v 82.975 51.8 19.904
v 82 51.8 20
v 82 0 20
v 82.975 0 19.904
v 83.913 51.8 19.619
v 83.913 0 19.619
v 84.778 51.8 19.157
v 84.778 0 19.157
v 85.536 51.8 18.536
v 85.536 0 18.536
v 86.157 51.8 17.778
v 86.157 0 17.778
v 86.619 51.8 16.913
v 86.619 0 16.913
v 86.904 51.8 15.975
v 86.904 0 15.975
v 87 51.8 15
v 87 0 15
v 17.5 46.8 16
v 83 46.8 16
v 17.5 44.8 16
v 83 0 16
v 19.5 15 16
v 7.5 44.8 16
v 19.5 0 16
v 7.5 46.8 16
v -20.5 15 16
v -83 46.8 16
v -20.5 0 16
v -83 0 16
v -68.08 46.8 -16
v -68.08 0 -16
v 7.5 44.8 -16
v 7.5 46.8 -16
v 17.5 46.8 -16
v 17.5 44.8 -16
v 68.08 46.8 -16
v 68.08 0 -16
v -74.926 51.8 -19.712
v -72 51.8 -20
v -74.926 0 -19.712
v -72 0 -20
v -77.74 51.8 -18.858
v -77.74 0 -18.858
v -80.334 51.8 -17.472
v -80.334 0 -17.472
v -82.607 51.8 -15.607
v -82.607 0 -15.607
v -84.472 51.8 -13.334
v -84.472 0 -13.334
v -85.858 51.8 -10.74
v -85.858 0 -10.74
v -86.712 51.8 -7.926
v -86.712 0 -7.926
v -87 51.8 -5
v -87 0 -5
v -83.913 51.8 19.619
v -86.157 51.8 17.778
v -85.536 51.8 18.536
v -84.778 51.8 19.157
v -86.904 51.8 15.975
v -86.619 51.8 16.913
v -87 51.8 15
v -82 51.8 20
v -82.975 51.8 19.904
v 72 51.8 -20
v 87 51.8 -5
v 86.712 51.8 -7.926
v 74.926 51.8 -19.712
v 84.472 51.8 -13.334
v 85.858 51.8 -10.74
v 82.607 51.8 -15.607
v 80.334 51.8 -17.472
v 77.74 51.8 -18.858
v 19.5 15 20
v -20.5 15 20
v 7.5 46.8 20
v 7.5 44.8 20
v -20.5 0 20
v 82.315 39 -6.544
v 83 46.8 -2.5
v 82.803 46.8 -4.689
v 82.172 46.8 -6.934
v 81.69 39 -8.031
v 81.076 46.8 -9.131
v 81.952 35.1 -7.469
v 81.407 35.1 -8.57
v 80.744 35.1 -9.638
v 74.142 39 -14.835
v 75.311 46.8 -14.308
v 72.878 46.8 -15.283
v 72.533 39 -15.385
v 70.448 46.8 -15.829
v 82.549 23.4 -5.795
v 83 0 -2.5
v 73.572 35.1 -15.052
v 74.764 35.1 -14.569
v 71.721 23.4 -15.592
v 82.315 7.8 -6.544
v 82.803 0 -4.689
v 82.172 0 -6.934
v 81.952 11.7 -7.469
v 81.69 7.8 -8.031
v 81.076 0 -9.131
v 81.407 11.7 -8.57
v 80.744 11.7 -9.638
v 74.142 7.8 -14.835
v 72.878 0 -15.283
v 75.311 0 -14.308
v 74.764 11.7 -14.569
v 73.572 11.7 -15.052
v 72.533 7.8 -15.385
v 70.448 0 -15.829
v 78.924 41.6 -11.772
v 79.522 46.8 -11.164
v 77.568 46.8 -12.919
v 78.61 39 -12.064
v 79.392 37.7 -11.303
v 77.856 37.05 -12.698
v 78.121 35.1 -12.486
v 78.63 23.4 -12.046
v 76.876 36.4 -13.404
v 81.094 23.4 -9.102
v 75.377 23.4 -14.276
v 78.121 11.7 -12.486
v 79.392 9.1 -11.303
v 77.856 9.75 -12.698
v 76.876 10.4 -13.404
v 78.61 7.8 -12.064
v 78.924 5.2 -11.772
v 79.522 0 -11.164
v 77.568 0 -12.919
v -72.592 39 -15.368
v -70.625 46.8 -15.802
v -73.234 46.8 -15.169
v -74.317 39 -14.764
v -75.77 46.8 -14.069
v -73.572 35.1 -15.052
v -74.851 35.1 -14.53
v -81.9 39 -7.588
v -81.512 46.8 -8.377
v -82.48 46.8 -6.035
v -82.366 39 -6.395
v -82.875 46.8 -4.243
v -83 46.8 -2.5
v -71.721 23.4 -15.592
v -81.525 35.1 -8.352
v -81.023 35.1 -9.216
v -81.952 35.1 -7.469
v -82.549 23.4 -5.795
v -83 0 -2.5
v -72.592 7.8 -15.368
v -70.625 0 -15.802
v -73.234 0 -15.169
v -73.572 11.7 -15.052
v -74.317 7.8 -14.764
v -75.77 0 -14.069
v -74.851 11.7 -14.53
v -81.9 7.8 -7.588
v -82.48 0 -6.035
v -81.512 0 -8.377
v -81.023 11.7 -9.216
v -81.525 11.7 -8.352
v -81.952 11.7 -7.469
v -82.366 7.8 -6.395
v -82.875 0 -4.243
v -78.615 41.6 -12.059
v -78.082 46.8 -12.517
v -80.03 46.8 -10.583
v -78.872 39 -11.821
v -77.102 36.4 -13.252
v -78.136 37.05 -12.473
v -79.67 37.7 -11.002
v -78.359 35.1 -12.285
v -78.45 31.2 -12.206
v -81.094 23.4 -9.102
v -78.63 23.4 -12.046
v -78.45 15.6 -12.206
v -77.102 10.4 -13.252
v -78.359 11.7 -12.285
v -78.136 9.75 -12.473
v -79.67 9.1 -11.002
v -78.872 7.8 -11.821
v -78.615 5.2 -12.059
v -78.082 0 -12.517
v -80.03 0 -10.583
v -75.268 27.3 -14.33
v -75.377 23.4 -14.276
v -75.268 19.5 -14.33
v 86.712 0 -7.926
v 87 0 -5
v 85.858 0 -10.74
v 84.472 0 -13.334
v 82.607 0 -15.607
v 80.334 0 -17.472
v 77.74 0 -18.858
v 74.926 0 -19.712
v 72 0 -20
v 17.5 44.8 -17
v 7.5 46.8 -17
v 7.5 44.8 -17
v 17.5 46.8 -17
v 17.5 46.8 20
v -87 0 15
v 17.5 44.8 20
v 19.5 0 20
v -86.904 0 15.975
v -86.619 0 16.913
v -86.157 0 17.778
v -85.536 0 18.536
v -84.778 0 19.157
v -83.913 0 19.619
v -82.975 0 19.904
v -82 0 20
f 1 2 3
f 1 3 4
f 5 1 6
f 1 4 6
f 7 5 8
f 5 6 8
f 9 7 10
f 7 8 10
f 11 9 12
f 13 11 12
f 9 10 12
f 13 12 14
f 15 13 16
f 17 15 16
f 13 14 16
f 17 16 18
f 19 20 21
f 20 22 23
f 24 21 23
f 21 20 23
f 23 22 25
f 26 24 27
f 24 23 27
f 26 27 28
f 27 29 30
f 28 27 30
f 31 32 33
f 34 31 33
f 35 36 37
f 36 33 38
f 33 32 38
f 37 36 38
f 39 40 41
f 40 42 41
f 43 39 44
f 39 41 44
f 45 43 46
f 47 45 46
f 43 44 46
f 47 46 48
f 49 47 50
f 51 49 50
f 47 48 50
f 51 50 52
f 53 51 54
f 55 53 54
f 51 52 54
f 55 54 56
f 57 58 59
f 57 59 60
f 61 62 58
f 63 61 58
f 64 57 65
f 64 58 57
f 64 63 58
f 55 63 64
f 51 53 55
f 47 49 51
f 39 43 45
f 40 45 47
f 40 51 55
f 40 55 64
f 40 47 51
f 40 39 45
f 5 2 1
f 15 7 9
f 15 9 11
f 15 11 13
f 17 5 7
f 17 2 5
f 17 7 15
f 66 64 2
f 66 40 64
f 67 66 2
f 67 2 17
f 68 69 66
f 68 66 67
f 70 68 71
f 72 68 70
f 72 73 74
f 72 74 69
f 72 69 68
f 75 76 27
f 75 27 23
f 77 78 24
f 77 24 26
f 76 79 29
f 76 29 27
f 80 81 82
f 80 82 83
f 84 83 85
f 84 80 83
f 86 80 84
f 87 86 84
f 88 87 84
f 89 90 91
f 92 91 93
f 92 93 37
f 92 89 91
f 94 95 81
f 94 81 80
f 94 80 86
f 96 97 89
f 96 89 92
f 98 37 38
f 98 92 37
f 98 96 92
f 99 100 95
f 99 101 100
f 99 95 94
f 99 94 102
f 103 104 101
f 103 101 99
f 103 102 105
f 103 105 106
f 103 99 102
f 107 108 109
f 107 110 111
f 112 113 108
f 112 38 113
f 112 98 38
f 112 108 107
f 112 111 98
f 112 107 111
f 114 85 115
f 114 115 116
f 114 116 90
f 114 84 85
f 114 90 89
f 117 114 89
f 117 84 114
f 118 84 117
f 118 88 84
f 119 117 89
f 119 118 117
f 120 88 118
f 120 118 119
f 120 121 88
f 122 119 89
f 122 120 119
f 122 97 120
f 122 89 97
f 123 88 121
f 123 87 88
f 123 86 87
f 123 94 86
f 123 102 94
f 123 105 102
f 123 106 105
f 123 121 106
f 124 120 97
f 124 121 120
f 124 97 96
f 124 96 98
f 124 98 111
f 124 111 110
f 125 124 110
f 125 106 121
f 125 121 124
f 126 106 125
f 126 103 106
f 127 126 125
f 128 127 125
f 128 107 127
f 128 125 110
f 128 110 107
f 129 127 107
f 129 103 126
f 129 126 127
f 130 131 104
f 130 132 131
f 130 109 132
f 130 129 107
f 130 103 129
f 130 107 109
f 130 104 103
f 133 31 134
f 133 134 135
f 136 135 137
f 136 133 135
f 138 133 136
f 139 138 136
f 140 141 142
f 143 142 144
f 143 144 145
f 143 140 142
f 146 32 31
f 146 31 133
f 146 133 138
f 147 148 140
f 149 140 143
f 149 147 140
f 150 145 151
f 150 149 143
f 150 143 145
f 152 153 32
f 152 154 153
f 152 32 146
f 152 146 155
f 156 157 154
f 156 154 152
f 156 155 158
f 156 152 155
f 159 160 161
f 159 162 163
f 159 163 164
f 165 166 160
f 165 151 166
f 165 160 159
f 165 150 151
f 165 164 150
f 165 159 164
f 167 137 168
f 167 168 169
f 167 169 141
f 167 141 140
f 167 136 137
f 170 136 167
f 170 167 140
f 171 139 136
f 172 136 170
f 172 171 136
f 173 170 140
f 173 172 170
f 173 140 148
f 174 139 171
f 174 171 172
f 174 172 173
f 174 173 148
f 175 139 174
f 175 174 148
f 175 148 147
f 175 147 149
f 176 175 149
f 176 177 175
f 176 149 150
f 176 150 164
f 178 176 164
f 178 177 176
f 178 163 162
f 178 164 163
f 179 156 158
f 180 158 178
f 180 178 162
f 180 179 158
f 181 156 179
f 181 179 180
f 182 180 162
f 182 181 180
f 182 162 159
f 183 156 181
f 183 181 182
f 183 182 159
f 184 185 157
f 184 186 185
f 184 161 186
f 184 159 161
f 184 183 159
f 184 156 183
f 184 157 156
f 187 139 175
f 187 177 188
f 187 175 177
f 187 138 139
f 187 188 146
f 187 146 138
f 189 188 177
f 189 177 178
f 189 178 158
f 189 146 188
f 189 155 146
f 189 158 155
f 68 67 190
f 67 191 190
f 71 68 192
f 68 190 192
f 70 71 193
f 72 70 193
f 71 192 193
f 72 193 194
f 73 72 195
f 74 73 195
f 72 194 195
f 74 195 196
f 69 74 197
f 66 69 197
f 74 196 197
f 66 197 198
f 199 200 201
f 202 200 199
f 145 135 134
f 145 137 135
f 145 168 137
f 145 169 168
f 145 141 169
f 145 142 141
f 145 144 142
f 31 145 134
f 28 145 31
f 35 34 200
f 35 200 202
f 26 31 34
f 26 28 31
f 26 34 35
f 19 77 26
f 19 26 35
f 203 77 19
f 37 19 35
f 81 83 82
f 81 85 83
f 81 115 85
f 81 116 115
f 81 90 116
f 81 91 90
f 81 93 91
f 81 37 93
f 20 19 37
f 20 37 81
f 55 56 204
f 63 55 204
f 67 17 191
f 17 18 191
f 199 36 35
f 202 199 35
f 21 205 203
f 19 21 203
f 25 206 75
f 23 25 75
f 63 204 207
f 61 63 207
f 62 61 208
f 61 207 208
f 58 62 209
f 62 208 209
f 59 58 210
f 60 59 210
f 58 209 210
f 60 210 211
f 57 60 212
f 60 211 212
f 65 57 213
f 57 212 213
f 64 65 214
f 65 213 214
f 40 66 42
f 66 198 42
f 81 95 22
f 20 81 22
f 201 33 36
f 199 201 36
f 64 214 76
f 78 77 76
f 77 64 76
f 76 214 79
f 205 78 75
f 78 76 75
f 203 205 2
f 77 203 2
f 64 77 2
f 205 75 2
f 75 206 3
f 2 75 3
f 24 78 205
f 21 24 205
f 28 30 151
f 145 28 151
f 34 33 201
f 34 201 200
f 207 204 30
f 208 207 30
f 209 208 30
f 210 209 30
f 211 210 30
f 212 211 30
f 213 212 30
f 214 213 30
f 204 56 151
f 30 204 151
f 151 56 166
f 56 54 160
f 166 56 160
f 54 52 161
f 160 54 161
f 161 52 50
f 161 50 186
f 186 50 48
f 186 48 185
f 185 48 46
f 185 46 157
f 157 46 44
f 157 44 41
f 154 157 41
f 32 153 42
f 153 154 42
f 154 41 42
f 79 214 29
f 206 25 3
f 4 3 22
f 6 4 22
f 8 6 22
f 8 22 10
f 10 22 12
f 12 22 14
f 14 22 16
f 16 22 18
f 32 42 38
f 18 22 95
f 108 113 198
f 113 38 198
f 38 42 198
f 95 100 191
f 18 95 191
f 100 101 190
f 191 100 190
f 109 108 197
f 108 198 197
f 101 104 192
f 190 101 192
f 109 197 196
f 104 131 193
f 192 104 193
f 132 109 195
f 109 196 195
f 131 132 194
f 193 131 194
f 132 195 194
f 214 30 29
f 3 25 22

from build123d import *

# Parameters (mm, degrees)
BOSS_EXTRUDE1_DEPTH = 46.8
SKETCH5_W           = 40
SKETCH5_H           = 15
CUT_EXTRUDE1_DEPTH  = 4
BOSS_EXTRUDE3_DEPTH = 5
SKETCH13_W          = 10
SKETCH13_H          = 2
CUT_EXTRUDE2_DEPTH  = 37


with BuildPart() as part:
    # Sketch1 → Boss-Extrude1 (new body)
    with BuildSketch(Plane(origin=(0, 0, 0), x_dir=(1, 0, 0), z_dir=(0, 1, 0))):
        with BuildLine():
            Line((-82, -20), (82, -20))
            ThreePointArc((82, -20), (85.535533906, -18.535533906), (87, -15))
            Line((87, -15), (87, 5))
            ThreePointArc((87, 5), (82.606601718, 15.606601718), (72, 20))
            Line((72, 20), (-72, 20))
            ThreePointArc((-72, 20), (-82.606601718, 15.606601718), (-87, 5))
            Line((-87, 5), (-87, -15))
            ThreePointArc((-87, -15), (-85.535533906, -18.535533906), (-82, -20))
        make_face()
        with BuildLine():
            Line((-68.08, 16), (68.08, 16))
            add(Edge.make_bspline(
                [(83, 2.5), (83, 16), (68.08, 16)],
                knots=[0, 0, 0, 1.570796327, 1.570796327, 1.570796327], degree=2, weights=[1, 0.707106781, 1]))
            Line((83, 2.5), (83, -16))
            Line((83, -16), (-83, -16))
            Line((-83, -16), (-83, 2.5))
            add(Edge.make_bspline(
                [(-68.08, 16), (-83, 16), (-83, 2.5)],
                knots=[4.71238898, 4.71238898, 4.71238898, 6.283185307, 6.283185307, 6.283185307], degree=2, weights=[1, 0.707106781, 1]))
        make_face(mode=Mode.SUBTRACT)
    extrude(amount=BOSS_EXTRUDE1_DEPTH)

    # Sketch5 → Cut-Extrude1 (cut)
    with BuildSketch(Plane.XY.offset(20)):
        with Locations((-0.5, 7.5)):
            Rectangle(SKETCH5_W, SKETCH5_H)
    extrude(amount=-CUT_EXTRUDE1_DEPTH, mode=Mode.SUBTRACT)

    # Sketch10 → Boss-Extrude3 (add)
    with BuildSketch(Plane(origin=(0, 46.8, 0), x_dir=(1, 0, 0), z_dir=(0, 1, 0))):
        with BuildLine():
            Line((-82, -20), (82, -20))
            ThreePointArc((82, -20), (85.535533906, -18.535533906), (87, -15))
            Line((87, -15), (87, 5))
            ThreePointArc((87, 5), (82.606601718, 15.606601718), (72, 20))
            Line((72, 20), (-72, 20))
            ThreePointArc((-72, 20), (-82.606601718, 15.606601718), (-87, 5))
            Line((-87, 5), (-87, -15))
            ThreePointArc((-87, -15), (-85.535533906, -18.535533906), (-82, -20))
        make_face()
    extrude(amount=BOSS_EXTRUDE3_DEPTH)

    # Sketch13 → Cut-Extrude2 (cut)
    with BuildSketch(Plane.XY.offset(20)):
        with Locations((12.5, 45.8)):
            Rectangle(SKETCH13_W, SKETCH13_H)
    extrude(amount=-CUT_EXTRUDE2_DEPTH, mode=Mode.SUBTRACT)


solid = part.part
